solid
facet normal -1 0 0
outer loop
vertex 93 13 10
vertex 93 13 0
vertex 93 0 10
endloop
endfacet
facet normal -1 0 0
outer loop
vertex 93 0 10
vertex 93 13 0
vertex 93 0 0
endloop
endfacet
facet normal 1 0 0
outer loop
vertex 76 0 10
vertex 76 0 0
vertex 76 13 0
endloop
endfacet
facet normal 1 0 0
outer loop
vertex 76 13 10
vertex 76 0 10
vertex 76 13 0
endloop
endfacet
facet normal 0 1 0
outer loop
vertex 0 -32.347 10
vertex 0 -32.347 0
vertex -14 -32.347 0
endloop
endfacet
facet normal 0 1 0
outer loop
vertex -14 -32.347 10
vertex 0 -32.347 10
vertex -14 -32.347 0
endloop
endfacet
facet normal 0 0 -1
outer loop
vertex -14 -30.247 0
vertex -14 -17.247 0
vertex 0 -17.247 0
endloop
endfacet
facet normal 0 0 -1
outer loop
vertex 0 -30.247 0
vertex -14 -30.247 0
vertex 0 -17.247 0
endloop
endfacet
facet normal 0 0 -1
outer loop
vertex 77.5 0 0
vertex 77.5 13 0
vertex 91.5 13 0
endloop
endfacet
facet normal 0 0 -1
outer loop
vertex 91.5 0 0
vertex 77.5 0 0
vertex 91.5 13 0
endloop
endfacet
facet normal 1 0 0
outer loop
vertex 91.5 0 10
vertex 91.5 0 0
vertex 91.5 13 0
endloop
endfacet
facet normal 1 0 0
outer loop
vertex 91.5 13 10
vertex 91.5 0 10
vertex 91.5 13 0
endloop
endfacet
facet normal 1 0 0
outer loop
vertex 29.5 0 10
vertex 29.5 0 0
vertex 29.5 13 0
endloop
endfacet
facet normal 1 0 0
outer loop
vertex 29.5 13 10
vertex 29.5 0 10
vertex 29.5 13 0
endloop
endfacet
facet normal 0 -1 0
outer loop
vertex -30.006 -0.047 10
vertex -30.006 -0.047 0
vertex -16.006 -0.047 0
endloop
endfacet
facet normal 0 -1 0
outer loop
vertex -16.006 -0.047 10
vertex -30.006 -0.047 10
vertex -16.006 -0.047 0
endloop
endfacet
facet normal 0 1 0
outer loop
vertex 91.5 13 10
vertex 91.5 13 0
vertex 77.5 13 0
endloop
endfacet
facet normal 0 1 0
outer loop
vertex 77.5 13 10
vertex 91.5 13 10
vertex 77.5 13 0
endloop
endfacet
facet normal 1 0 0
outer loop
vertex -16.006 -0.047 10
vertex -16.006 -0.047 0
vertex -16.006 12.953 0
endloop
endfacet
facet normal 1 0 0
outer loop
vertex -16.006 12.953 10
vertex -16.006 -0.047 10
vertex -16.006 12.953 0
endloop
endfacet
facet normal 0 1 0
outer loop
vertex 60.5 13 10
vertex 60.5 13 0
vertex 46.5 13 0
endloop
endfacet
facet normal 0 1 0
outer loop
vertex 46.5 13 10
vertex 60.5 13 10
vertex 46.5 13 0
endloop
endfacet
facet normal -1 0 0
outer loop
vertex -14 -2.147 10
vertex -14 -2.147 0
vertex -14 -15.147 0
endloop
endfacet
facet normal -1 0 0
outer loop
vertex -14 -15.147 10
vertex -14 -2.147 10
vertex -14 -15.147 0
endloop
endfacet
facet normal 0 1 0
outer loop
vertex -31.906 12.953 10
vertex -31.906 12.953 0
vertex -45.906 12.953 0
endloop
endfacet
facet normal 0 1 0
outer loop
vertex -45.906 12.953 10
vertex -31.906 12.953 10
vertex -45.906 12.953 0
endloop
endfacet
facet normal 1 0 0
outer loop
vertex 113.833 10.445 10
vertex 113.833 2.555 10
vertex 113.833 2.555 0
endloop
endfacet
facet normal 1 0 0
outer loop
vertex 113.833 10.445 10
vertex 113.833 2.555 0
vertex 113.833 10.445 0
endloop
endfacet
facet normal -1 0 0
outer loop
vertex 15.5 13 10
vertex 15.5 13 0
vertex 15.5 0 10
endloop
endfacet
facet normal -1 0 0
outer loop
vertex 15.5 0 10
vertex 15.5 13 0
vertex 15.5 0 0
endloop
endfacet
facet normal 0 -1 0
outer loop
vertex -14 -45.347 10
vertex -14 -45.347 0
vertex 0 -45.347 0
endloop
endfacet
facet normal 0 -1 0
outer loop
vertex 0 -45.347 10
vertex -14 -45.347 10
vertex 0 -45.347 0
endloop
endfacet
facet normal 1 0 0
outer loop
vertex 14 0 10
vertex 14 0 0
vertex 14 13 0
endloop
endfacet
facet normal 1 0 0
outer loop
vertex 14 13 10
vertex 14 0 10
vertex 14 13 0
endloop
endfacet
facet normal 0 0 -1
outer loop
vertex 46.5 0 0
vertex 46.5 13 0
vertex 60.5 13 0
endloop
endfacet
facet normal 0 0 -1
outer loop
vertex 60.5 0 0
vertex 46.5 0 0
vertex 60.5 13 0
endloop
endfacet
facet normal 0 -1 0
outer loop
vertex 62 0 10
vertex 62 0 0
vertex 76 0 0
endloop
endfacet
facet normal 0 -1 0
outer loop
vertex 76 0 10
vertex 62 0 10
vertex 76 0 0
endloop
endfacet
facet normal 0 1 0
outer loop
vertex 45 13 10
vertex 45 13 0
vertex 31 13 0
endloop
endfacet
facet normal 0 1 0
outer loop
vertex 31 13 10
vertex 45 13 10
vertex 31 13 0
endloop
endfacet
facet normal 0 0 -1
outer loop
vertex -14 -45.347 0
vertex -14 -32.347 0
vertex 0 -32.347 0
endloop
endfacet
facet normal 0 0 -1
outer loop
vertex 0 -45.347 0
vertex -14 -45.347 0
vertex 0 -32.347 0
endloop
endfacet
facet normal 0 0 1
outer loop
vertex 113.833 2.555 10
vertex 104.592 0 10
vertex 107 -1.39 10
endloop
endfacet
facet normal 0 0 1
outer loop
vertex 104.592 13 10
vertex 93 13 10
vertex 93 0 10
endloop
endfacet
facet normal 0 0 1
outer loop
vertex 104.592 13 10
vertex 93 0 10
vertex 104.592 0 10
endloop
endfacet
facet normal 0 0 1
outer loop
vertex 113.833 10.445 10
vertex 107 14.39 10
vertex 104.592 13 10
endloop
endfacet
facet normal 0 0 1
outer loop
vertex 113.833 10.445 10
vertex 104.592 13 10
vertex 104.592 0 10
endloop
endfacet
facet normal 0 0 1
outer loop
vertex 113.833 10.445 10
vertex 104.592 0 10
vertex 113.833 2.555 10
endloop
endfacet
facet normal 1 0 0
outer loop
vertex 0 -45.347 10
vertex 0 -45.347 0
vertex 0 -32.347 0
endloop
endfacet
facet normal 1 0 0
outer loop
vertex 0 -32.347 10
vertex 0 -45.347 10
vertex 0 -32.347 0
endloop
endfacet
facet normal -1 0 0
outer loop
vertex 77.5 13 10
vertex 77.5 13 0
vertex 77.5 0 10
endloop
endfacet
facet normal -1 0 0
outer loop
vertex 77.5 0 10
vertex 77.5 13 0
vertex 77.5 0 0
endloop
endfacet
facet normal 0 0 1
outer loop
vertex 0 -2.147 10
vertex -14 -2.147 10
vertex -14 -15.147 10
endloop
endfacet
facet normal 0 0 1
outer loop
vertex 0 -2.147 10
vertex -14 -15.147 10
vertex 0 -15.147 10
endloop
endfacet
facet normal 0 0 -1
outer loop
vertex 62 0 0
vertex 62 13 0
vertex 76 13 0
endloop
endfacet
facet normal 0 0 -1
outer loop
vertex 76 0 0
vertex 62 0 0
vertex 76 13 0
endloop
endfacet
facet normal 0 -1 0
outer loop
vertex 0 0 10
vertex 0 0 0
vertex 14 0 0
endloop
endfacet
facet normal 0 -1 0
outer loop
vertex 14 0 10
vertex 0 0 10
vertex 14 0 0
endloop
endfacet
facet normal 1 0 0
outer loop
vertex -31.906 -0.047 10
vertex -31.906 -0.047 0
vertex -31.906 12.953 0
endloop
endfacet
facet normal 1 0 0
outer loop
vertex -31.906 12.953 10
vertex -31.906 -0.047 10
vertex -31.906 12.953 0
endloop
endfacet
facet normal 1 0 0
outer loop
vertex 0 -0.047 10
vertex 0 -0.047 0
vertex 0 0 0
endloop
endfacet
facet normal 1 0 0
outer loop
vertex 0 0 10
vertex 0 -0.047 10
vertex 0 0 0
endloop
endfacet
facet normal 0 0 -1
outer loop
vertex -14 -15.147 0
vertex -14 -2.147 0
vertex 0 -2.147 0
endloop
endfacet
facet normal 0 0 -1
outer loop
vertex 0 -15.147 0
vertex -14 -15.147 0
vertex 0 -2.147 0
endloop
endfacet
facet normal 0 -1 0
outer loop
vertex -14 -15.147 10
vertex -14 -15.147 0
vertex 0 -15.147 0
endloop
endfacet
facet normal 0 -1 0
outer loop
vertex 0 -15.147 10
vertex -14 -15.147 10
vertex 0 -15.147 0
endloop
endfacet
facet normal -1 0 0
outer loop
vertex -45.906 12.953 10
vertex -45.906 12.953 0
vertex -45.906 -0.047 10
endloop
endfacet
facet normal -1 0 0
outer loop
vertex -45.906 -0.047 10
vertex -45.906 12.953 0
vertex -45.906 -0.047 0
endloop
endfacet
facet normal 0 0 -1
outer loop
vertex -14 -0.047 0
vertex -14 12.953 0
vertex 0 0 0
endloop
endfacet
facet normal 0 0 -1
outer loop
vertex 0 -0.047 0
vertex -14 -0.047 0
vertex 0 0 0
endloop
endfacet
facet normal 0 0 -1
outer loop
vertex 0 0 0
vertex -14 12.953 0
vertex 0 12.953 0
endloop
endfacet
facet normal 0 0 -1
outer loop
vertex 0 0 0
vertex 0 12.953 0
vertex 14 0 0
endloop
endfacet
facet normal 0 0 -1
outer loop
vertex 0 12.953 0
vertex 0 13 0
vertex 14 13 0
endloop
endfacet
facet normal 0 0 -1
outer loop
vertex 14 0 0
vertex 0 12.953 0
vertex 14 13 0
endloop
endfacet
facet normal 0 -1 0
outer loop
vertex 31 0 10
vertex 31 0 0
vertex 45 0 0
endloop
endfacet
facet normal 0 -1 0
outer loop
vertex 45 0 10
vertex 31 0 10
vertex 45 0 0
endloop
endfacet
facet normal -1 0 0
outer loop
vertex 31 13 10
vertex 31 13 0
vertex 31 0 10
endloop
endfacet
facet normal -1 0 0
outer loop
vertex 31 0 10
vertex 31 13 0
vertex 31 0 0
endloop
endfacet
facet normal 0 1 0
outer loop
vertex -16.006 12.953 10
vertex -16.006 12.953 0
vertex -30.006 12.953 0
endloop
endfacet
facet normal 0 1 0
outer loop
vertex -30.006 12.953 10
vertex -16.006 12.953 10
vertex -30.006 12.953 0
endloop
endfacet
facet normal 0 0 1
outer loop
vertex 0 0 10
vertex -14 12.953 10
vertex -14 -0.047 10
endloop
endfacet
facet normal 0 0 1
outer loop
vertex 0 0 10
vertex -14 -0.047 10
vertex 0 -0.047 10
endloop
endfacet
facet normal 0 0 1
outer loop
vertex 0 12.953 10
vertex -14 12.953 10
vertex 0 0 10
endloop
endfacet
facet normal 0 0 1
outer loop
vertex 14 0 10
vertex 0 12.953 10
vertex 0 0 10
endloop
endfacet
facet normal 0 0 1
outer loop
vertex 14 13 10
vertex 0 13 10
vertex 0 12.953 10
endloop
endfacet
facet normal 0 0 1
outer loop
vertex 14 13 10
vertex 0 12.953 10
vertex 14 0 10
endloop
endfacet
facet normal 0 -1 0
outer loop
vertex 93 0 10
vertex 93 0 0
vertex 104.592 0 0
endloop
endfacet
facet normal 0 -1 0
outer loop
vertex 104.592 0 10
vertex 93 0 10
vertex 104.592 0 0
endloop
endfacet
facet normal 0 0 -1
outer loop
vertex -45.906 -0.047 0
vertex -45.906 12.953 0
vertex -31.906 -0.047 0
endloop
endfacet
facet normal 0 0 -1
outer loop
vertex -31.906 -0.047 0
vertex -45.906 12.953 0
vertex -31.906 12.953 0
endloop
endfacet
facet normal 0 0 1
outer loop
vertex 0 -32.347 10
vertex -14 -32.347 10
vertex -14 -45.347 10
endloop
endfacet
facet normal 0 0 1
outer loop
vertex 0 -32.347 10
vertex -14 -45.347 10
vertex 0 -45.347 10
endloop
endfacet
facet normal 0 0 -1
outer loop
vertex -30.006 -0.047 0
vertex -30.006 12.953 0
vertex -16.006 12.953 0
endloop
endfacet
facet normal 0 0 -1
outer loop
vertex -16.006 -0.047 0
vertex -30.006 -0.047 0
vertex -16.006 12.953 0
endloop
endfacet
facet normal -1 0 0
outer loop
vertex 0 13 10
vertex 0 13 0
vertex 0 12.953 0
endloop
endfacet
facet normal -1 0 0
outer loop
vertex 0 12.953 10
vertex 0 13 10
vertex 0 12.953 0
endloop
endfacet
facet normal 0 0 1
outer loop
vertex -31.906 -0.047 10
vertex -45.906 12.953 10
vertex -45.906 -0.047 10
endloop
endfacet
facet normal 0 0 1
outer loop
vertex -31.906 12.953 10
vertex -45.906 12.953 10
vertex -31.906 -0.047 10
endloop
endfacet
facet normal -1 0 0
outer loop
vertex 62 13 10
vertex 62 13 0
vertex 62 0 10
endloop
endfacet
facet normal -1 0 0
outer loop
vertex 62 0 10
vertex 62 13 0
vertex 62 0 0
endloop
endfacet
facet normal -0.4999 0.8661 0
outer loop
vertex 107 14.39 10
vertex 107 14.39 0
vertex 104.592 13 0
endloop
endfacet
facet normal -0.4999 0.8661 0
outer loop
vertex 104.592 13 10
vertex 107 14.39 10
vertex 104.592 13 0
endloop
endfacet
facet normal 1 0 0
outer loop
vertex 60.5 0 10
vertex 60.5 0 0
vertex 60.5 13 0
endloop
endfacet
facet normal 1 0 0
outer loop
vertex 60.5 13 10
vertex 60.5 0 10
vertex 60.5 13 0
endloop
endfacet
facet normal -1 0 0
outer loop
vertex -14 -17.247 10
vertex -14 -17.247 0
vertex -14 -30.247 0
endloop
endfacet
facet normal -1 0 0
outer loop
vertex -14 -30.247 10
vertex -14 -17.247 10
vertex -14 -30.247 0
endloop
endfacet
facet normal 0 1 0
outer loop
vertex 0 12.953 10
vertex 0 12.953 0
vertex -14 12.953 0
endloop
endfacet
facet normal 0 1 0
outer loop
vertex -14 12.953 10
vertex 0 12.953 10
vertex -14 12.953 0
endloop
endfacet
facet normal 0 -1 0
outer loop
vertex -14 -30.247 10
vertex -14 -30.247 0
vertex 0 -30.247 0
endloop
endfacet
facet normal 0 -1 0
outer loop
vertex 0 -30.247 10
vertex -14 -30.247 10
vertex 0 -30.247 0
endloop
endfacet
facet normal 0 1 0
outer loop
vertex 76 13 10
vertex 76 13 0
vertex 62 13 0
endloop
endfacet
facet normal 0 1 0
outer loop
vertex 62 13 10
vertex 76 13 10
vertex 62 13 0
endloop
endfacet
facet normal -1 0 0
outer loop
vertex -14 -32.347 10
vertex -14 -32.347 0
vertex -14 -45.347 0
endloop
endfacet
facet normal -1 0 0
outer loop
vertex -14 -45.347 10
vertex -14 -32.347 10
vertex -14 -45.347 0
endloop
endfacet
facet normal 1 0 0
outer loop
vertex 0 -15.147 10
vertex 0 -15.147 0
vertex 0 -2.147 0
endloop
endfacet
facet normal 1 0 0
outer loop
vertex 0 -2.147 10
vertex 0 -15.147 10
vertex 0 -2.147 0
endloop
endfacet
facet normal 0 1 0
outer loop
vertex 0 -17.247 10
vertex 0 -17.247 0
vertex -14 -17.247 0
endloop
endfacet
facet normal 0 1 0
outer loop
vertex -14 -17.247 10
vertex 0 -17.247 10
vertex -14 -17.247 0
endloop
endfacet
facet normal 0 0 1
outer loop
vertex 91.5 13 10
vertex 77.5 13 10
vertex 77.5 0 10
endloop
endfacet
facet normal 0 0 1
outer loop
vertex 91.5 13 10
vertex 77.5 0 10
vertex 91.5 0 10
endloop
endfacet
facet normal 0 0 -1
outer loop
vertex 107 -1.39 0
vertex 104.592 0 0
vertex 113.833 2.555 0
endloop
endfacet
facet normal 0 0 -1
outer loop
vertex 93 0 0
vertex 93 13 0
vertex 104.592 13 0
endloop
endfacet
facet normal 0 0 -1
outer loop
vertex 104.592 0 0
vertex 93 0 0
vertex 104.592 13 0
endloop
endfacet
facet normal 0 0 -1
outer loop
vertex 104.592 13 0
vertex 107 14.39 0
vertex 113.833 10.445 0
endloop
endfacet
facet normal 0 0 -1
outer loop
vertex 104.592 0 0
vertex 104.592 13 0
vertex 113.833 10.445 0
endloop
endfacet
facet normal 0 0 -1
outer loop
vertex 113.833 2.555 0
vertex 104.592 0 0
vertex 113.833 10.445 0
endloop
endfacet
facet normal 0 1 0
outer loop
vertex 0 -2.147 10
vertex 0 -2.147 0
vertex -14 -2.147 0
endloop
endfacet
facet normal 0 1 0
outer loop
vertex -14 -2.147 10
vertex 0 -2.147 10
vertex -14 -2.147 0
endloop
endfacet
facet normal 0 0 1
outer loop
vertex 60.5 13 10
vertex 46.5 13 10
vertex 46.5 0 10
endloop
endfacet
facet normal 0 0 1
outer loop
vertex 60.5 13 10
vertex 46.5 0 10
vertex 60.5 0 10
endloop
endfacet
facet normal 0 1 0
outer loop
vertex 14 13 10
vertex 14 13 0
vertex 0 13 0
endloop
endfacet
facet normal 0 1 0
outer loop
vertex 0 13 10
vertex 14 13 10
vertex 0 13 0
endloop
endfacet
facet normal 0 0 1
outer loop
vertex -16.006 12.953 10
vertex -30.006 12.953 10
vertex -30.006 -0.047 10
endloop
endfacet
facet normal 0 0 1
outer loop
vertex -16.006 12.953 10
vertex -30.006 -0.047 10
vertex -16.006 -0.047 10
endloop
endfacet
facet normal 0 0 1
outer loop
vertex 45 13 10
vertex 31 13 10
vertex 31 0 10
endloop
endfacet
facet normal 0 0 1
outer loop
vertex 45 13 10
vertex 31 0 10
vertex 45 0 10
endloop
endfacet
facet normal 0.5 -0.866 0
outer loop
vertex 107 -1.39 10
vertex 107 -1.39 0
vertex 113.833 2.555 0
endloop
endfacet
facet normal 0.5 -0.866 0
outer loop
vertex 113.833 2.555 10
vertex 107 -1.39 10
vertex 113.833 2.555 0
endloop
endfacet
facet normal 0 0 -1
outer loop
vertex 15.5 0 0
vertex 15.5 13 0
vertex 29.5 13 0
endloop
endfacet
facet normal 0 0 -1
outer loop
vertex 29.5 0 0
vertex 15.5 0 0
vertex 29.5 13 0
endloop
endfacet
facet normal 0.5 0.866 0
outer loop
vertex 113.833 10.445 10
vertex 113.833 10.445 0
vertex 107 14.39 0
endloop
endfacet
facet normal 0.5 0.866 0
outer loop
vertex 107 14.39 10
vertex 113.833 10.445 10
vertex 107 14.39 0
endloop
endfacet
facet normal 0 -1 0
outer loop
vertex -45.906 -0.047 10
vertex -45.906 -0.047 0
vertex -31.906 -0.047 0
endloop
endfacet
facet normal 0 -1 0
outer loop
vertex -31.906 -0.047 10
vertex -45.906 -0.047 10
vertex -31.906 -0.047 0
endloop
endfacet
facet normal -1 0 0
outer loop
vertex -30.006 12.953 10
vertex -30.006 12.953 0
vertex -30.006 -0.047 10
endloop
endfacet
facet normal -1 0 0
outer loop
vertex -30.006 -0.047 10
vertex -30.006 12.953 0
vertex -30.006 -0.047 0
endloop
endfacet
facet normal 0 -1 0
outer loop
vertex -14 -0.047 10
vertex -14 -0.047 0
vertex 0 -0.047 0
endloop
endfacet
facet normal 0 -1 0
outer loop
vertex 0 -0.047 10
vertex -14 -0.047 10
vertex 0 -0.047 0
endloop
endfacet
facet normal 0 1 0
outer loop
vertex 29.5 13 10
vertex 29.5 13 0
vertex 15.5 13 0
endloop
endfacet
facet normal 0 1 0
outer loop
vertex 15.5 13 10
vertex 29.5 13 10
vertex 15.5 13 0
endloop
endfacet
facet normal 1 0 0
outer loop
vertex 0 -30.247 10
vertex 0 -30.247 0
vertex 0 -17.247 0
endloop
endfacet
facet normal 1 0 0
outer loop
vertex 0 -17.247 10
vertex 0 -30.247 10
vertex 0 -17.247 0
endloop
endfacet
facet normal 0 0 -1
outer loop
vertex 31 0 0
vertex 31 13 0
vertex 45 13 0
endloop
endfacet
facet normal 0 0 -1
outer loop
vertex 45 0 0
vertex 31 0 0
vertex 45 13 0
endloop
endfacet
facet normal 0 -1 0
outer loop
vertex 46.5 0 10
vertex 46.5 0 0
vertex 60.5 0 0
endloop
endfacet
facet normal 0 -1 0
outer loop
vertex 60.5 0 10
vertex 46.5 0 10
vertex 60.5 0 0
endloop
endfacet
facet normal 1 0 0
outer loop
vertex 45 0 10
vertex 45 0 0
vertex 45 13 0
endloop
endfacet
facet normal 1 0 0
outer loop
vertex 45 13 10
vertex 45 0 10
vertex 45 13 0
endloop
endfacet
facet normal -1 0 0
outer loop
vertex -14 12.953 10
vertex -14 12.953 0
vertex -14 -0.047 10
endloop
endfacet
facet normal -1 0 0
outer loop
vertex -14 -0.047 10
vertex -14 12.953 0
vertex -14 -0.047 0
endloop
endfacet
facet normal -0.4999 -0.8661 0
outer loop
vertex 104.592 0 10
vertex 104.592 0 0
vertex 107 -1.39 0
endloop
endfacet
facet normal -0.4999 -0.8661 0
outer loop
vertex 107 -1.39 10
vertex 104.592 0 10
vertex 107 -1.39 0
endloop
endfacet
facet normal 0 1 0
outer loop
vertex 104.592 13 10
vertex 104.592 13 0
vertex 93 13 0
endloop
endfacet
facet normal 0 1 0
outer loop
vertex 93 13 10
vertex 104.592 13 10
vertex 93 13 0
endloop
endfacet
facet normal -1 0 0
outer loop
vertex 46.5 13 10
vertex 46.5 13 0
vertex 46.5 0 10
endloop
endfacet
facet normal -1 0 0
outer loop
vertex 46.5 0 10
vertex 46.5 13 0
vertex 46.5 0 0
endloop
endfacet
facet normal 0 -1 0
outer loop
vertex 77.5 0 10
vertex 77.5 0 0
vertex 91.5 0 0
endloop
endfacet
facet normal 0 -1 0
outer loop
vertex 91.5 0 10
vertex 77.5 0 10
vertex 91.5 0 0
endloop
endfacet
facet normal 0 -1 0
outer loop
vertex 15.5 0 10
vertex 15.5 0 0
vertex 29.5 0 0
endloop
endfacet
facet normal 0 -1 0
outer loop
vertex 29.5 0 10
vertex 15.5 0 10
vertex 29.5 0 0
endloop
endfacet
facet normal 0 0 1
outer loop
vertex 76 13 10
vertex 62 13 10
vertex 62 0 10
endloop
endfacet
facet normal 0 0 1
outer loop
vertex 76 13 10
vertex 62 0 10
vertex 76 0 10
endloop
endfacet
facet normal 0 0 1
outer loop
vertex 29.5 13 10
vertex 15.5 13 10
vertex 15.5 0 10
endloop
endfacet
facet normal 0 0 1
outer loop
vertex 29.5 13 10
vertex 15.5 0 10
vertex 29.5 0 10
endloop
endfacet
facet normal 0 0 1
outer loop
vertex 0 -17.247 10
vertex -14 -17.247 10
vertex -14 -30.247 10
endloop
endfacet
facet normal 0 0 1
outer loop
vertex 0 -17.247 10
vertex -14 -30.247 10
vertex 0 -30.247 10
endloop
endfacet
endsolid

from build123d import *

# Parameters (mm, degrees)
F1_DEPTH = 10


with BuildPart() as f1:
    # F0 (on Top) → F1 (new body)
    with BuildSketch(Plane.XY):
        Polygon((0, 12.953434), (0, 0), (14, 0), (14, 6.5), (14, 13), (0, 13), align=None)
        Polygon((0, -0.046566), (0, 0), (0, 12.953434), (-14, 12.953434), (-14, 6.453434), (-14, -0.046566), align=None)
        Polygon((-31.906402, -0.046566), (-31.906402, 6.453434), (-31.906402, 12.953434), (-45.906402, 12.953434), (-45.906402, -0.046566), align=None)
        Polygon((-16.006402, -0.046566), (-16.006402, 6.453434), (-16.006402, 12.953434), (-30.006402, 12.953434), (-30.006402, 6.453434), (-30.006402, -0.046566), align=None)
        Polygon((93, 13), (93, 6.5), (93, 0), (104.592459, 0), (100.167064, 2.555003), (100.167064, 10.444997), (104.592459, 13), align=None)
        Polygon((77.5, 13), (77.5, 6.5), (77.5, 0), (91.5, 0), (91.5, 6.5), (91.5, 13), align=None)
        Polygon((62, 13), (62, 6.5), (62, 0), (76, 0), (76, 6.5), (76, 13), align=None)
        Polygon((46.5, 13), (46.5, 6.5), (46.5, 0), (60.5, 0), (60.5, 6.5), (60.5, 13), align=None)
        Polygon((31, 13), (31, 6.5), (31, 0), (45, 0), (45, 6.5), (45, 13), align=None)
        Polygon((15.5, 13), (15.5, 6.5), (15.5, 0), (29.5, 0), (29.5, 6.5), (29.5, 13), align=None)
        Polygon((0, -32.346566), (-7, -32.346566), (-14, -32.346566), (-14, -45.346566), (0, -45.346566), align=None)
        Polygon((0, -17.246566), (-7, -17.246566), (-14, -17.246566), (-14, -30.246566), (-7, -30.246566), (0, -30.246566), align=None)
        Polygon((-7, -15.146566), (0, -15.146566), (0, -2.146566), (-14, -2.146566), (-14, -15.146566), align=None)
        Polygon((100.167064, 2.555003), (104.592459, 0), (107, -1.389995), (113.832936, 2.555003), (113.832936, 10.444997), (107, 14.389995), (104.592459, 13), (100.167064, 10.444997), align=None)
    extrude(amount=F1_DEPTH)


solid = f1.part
